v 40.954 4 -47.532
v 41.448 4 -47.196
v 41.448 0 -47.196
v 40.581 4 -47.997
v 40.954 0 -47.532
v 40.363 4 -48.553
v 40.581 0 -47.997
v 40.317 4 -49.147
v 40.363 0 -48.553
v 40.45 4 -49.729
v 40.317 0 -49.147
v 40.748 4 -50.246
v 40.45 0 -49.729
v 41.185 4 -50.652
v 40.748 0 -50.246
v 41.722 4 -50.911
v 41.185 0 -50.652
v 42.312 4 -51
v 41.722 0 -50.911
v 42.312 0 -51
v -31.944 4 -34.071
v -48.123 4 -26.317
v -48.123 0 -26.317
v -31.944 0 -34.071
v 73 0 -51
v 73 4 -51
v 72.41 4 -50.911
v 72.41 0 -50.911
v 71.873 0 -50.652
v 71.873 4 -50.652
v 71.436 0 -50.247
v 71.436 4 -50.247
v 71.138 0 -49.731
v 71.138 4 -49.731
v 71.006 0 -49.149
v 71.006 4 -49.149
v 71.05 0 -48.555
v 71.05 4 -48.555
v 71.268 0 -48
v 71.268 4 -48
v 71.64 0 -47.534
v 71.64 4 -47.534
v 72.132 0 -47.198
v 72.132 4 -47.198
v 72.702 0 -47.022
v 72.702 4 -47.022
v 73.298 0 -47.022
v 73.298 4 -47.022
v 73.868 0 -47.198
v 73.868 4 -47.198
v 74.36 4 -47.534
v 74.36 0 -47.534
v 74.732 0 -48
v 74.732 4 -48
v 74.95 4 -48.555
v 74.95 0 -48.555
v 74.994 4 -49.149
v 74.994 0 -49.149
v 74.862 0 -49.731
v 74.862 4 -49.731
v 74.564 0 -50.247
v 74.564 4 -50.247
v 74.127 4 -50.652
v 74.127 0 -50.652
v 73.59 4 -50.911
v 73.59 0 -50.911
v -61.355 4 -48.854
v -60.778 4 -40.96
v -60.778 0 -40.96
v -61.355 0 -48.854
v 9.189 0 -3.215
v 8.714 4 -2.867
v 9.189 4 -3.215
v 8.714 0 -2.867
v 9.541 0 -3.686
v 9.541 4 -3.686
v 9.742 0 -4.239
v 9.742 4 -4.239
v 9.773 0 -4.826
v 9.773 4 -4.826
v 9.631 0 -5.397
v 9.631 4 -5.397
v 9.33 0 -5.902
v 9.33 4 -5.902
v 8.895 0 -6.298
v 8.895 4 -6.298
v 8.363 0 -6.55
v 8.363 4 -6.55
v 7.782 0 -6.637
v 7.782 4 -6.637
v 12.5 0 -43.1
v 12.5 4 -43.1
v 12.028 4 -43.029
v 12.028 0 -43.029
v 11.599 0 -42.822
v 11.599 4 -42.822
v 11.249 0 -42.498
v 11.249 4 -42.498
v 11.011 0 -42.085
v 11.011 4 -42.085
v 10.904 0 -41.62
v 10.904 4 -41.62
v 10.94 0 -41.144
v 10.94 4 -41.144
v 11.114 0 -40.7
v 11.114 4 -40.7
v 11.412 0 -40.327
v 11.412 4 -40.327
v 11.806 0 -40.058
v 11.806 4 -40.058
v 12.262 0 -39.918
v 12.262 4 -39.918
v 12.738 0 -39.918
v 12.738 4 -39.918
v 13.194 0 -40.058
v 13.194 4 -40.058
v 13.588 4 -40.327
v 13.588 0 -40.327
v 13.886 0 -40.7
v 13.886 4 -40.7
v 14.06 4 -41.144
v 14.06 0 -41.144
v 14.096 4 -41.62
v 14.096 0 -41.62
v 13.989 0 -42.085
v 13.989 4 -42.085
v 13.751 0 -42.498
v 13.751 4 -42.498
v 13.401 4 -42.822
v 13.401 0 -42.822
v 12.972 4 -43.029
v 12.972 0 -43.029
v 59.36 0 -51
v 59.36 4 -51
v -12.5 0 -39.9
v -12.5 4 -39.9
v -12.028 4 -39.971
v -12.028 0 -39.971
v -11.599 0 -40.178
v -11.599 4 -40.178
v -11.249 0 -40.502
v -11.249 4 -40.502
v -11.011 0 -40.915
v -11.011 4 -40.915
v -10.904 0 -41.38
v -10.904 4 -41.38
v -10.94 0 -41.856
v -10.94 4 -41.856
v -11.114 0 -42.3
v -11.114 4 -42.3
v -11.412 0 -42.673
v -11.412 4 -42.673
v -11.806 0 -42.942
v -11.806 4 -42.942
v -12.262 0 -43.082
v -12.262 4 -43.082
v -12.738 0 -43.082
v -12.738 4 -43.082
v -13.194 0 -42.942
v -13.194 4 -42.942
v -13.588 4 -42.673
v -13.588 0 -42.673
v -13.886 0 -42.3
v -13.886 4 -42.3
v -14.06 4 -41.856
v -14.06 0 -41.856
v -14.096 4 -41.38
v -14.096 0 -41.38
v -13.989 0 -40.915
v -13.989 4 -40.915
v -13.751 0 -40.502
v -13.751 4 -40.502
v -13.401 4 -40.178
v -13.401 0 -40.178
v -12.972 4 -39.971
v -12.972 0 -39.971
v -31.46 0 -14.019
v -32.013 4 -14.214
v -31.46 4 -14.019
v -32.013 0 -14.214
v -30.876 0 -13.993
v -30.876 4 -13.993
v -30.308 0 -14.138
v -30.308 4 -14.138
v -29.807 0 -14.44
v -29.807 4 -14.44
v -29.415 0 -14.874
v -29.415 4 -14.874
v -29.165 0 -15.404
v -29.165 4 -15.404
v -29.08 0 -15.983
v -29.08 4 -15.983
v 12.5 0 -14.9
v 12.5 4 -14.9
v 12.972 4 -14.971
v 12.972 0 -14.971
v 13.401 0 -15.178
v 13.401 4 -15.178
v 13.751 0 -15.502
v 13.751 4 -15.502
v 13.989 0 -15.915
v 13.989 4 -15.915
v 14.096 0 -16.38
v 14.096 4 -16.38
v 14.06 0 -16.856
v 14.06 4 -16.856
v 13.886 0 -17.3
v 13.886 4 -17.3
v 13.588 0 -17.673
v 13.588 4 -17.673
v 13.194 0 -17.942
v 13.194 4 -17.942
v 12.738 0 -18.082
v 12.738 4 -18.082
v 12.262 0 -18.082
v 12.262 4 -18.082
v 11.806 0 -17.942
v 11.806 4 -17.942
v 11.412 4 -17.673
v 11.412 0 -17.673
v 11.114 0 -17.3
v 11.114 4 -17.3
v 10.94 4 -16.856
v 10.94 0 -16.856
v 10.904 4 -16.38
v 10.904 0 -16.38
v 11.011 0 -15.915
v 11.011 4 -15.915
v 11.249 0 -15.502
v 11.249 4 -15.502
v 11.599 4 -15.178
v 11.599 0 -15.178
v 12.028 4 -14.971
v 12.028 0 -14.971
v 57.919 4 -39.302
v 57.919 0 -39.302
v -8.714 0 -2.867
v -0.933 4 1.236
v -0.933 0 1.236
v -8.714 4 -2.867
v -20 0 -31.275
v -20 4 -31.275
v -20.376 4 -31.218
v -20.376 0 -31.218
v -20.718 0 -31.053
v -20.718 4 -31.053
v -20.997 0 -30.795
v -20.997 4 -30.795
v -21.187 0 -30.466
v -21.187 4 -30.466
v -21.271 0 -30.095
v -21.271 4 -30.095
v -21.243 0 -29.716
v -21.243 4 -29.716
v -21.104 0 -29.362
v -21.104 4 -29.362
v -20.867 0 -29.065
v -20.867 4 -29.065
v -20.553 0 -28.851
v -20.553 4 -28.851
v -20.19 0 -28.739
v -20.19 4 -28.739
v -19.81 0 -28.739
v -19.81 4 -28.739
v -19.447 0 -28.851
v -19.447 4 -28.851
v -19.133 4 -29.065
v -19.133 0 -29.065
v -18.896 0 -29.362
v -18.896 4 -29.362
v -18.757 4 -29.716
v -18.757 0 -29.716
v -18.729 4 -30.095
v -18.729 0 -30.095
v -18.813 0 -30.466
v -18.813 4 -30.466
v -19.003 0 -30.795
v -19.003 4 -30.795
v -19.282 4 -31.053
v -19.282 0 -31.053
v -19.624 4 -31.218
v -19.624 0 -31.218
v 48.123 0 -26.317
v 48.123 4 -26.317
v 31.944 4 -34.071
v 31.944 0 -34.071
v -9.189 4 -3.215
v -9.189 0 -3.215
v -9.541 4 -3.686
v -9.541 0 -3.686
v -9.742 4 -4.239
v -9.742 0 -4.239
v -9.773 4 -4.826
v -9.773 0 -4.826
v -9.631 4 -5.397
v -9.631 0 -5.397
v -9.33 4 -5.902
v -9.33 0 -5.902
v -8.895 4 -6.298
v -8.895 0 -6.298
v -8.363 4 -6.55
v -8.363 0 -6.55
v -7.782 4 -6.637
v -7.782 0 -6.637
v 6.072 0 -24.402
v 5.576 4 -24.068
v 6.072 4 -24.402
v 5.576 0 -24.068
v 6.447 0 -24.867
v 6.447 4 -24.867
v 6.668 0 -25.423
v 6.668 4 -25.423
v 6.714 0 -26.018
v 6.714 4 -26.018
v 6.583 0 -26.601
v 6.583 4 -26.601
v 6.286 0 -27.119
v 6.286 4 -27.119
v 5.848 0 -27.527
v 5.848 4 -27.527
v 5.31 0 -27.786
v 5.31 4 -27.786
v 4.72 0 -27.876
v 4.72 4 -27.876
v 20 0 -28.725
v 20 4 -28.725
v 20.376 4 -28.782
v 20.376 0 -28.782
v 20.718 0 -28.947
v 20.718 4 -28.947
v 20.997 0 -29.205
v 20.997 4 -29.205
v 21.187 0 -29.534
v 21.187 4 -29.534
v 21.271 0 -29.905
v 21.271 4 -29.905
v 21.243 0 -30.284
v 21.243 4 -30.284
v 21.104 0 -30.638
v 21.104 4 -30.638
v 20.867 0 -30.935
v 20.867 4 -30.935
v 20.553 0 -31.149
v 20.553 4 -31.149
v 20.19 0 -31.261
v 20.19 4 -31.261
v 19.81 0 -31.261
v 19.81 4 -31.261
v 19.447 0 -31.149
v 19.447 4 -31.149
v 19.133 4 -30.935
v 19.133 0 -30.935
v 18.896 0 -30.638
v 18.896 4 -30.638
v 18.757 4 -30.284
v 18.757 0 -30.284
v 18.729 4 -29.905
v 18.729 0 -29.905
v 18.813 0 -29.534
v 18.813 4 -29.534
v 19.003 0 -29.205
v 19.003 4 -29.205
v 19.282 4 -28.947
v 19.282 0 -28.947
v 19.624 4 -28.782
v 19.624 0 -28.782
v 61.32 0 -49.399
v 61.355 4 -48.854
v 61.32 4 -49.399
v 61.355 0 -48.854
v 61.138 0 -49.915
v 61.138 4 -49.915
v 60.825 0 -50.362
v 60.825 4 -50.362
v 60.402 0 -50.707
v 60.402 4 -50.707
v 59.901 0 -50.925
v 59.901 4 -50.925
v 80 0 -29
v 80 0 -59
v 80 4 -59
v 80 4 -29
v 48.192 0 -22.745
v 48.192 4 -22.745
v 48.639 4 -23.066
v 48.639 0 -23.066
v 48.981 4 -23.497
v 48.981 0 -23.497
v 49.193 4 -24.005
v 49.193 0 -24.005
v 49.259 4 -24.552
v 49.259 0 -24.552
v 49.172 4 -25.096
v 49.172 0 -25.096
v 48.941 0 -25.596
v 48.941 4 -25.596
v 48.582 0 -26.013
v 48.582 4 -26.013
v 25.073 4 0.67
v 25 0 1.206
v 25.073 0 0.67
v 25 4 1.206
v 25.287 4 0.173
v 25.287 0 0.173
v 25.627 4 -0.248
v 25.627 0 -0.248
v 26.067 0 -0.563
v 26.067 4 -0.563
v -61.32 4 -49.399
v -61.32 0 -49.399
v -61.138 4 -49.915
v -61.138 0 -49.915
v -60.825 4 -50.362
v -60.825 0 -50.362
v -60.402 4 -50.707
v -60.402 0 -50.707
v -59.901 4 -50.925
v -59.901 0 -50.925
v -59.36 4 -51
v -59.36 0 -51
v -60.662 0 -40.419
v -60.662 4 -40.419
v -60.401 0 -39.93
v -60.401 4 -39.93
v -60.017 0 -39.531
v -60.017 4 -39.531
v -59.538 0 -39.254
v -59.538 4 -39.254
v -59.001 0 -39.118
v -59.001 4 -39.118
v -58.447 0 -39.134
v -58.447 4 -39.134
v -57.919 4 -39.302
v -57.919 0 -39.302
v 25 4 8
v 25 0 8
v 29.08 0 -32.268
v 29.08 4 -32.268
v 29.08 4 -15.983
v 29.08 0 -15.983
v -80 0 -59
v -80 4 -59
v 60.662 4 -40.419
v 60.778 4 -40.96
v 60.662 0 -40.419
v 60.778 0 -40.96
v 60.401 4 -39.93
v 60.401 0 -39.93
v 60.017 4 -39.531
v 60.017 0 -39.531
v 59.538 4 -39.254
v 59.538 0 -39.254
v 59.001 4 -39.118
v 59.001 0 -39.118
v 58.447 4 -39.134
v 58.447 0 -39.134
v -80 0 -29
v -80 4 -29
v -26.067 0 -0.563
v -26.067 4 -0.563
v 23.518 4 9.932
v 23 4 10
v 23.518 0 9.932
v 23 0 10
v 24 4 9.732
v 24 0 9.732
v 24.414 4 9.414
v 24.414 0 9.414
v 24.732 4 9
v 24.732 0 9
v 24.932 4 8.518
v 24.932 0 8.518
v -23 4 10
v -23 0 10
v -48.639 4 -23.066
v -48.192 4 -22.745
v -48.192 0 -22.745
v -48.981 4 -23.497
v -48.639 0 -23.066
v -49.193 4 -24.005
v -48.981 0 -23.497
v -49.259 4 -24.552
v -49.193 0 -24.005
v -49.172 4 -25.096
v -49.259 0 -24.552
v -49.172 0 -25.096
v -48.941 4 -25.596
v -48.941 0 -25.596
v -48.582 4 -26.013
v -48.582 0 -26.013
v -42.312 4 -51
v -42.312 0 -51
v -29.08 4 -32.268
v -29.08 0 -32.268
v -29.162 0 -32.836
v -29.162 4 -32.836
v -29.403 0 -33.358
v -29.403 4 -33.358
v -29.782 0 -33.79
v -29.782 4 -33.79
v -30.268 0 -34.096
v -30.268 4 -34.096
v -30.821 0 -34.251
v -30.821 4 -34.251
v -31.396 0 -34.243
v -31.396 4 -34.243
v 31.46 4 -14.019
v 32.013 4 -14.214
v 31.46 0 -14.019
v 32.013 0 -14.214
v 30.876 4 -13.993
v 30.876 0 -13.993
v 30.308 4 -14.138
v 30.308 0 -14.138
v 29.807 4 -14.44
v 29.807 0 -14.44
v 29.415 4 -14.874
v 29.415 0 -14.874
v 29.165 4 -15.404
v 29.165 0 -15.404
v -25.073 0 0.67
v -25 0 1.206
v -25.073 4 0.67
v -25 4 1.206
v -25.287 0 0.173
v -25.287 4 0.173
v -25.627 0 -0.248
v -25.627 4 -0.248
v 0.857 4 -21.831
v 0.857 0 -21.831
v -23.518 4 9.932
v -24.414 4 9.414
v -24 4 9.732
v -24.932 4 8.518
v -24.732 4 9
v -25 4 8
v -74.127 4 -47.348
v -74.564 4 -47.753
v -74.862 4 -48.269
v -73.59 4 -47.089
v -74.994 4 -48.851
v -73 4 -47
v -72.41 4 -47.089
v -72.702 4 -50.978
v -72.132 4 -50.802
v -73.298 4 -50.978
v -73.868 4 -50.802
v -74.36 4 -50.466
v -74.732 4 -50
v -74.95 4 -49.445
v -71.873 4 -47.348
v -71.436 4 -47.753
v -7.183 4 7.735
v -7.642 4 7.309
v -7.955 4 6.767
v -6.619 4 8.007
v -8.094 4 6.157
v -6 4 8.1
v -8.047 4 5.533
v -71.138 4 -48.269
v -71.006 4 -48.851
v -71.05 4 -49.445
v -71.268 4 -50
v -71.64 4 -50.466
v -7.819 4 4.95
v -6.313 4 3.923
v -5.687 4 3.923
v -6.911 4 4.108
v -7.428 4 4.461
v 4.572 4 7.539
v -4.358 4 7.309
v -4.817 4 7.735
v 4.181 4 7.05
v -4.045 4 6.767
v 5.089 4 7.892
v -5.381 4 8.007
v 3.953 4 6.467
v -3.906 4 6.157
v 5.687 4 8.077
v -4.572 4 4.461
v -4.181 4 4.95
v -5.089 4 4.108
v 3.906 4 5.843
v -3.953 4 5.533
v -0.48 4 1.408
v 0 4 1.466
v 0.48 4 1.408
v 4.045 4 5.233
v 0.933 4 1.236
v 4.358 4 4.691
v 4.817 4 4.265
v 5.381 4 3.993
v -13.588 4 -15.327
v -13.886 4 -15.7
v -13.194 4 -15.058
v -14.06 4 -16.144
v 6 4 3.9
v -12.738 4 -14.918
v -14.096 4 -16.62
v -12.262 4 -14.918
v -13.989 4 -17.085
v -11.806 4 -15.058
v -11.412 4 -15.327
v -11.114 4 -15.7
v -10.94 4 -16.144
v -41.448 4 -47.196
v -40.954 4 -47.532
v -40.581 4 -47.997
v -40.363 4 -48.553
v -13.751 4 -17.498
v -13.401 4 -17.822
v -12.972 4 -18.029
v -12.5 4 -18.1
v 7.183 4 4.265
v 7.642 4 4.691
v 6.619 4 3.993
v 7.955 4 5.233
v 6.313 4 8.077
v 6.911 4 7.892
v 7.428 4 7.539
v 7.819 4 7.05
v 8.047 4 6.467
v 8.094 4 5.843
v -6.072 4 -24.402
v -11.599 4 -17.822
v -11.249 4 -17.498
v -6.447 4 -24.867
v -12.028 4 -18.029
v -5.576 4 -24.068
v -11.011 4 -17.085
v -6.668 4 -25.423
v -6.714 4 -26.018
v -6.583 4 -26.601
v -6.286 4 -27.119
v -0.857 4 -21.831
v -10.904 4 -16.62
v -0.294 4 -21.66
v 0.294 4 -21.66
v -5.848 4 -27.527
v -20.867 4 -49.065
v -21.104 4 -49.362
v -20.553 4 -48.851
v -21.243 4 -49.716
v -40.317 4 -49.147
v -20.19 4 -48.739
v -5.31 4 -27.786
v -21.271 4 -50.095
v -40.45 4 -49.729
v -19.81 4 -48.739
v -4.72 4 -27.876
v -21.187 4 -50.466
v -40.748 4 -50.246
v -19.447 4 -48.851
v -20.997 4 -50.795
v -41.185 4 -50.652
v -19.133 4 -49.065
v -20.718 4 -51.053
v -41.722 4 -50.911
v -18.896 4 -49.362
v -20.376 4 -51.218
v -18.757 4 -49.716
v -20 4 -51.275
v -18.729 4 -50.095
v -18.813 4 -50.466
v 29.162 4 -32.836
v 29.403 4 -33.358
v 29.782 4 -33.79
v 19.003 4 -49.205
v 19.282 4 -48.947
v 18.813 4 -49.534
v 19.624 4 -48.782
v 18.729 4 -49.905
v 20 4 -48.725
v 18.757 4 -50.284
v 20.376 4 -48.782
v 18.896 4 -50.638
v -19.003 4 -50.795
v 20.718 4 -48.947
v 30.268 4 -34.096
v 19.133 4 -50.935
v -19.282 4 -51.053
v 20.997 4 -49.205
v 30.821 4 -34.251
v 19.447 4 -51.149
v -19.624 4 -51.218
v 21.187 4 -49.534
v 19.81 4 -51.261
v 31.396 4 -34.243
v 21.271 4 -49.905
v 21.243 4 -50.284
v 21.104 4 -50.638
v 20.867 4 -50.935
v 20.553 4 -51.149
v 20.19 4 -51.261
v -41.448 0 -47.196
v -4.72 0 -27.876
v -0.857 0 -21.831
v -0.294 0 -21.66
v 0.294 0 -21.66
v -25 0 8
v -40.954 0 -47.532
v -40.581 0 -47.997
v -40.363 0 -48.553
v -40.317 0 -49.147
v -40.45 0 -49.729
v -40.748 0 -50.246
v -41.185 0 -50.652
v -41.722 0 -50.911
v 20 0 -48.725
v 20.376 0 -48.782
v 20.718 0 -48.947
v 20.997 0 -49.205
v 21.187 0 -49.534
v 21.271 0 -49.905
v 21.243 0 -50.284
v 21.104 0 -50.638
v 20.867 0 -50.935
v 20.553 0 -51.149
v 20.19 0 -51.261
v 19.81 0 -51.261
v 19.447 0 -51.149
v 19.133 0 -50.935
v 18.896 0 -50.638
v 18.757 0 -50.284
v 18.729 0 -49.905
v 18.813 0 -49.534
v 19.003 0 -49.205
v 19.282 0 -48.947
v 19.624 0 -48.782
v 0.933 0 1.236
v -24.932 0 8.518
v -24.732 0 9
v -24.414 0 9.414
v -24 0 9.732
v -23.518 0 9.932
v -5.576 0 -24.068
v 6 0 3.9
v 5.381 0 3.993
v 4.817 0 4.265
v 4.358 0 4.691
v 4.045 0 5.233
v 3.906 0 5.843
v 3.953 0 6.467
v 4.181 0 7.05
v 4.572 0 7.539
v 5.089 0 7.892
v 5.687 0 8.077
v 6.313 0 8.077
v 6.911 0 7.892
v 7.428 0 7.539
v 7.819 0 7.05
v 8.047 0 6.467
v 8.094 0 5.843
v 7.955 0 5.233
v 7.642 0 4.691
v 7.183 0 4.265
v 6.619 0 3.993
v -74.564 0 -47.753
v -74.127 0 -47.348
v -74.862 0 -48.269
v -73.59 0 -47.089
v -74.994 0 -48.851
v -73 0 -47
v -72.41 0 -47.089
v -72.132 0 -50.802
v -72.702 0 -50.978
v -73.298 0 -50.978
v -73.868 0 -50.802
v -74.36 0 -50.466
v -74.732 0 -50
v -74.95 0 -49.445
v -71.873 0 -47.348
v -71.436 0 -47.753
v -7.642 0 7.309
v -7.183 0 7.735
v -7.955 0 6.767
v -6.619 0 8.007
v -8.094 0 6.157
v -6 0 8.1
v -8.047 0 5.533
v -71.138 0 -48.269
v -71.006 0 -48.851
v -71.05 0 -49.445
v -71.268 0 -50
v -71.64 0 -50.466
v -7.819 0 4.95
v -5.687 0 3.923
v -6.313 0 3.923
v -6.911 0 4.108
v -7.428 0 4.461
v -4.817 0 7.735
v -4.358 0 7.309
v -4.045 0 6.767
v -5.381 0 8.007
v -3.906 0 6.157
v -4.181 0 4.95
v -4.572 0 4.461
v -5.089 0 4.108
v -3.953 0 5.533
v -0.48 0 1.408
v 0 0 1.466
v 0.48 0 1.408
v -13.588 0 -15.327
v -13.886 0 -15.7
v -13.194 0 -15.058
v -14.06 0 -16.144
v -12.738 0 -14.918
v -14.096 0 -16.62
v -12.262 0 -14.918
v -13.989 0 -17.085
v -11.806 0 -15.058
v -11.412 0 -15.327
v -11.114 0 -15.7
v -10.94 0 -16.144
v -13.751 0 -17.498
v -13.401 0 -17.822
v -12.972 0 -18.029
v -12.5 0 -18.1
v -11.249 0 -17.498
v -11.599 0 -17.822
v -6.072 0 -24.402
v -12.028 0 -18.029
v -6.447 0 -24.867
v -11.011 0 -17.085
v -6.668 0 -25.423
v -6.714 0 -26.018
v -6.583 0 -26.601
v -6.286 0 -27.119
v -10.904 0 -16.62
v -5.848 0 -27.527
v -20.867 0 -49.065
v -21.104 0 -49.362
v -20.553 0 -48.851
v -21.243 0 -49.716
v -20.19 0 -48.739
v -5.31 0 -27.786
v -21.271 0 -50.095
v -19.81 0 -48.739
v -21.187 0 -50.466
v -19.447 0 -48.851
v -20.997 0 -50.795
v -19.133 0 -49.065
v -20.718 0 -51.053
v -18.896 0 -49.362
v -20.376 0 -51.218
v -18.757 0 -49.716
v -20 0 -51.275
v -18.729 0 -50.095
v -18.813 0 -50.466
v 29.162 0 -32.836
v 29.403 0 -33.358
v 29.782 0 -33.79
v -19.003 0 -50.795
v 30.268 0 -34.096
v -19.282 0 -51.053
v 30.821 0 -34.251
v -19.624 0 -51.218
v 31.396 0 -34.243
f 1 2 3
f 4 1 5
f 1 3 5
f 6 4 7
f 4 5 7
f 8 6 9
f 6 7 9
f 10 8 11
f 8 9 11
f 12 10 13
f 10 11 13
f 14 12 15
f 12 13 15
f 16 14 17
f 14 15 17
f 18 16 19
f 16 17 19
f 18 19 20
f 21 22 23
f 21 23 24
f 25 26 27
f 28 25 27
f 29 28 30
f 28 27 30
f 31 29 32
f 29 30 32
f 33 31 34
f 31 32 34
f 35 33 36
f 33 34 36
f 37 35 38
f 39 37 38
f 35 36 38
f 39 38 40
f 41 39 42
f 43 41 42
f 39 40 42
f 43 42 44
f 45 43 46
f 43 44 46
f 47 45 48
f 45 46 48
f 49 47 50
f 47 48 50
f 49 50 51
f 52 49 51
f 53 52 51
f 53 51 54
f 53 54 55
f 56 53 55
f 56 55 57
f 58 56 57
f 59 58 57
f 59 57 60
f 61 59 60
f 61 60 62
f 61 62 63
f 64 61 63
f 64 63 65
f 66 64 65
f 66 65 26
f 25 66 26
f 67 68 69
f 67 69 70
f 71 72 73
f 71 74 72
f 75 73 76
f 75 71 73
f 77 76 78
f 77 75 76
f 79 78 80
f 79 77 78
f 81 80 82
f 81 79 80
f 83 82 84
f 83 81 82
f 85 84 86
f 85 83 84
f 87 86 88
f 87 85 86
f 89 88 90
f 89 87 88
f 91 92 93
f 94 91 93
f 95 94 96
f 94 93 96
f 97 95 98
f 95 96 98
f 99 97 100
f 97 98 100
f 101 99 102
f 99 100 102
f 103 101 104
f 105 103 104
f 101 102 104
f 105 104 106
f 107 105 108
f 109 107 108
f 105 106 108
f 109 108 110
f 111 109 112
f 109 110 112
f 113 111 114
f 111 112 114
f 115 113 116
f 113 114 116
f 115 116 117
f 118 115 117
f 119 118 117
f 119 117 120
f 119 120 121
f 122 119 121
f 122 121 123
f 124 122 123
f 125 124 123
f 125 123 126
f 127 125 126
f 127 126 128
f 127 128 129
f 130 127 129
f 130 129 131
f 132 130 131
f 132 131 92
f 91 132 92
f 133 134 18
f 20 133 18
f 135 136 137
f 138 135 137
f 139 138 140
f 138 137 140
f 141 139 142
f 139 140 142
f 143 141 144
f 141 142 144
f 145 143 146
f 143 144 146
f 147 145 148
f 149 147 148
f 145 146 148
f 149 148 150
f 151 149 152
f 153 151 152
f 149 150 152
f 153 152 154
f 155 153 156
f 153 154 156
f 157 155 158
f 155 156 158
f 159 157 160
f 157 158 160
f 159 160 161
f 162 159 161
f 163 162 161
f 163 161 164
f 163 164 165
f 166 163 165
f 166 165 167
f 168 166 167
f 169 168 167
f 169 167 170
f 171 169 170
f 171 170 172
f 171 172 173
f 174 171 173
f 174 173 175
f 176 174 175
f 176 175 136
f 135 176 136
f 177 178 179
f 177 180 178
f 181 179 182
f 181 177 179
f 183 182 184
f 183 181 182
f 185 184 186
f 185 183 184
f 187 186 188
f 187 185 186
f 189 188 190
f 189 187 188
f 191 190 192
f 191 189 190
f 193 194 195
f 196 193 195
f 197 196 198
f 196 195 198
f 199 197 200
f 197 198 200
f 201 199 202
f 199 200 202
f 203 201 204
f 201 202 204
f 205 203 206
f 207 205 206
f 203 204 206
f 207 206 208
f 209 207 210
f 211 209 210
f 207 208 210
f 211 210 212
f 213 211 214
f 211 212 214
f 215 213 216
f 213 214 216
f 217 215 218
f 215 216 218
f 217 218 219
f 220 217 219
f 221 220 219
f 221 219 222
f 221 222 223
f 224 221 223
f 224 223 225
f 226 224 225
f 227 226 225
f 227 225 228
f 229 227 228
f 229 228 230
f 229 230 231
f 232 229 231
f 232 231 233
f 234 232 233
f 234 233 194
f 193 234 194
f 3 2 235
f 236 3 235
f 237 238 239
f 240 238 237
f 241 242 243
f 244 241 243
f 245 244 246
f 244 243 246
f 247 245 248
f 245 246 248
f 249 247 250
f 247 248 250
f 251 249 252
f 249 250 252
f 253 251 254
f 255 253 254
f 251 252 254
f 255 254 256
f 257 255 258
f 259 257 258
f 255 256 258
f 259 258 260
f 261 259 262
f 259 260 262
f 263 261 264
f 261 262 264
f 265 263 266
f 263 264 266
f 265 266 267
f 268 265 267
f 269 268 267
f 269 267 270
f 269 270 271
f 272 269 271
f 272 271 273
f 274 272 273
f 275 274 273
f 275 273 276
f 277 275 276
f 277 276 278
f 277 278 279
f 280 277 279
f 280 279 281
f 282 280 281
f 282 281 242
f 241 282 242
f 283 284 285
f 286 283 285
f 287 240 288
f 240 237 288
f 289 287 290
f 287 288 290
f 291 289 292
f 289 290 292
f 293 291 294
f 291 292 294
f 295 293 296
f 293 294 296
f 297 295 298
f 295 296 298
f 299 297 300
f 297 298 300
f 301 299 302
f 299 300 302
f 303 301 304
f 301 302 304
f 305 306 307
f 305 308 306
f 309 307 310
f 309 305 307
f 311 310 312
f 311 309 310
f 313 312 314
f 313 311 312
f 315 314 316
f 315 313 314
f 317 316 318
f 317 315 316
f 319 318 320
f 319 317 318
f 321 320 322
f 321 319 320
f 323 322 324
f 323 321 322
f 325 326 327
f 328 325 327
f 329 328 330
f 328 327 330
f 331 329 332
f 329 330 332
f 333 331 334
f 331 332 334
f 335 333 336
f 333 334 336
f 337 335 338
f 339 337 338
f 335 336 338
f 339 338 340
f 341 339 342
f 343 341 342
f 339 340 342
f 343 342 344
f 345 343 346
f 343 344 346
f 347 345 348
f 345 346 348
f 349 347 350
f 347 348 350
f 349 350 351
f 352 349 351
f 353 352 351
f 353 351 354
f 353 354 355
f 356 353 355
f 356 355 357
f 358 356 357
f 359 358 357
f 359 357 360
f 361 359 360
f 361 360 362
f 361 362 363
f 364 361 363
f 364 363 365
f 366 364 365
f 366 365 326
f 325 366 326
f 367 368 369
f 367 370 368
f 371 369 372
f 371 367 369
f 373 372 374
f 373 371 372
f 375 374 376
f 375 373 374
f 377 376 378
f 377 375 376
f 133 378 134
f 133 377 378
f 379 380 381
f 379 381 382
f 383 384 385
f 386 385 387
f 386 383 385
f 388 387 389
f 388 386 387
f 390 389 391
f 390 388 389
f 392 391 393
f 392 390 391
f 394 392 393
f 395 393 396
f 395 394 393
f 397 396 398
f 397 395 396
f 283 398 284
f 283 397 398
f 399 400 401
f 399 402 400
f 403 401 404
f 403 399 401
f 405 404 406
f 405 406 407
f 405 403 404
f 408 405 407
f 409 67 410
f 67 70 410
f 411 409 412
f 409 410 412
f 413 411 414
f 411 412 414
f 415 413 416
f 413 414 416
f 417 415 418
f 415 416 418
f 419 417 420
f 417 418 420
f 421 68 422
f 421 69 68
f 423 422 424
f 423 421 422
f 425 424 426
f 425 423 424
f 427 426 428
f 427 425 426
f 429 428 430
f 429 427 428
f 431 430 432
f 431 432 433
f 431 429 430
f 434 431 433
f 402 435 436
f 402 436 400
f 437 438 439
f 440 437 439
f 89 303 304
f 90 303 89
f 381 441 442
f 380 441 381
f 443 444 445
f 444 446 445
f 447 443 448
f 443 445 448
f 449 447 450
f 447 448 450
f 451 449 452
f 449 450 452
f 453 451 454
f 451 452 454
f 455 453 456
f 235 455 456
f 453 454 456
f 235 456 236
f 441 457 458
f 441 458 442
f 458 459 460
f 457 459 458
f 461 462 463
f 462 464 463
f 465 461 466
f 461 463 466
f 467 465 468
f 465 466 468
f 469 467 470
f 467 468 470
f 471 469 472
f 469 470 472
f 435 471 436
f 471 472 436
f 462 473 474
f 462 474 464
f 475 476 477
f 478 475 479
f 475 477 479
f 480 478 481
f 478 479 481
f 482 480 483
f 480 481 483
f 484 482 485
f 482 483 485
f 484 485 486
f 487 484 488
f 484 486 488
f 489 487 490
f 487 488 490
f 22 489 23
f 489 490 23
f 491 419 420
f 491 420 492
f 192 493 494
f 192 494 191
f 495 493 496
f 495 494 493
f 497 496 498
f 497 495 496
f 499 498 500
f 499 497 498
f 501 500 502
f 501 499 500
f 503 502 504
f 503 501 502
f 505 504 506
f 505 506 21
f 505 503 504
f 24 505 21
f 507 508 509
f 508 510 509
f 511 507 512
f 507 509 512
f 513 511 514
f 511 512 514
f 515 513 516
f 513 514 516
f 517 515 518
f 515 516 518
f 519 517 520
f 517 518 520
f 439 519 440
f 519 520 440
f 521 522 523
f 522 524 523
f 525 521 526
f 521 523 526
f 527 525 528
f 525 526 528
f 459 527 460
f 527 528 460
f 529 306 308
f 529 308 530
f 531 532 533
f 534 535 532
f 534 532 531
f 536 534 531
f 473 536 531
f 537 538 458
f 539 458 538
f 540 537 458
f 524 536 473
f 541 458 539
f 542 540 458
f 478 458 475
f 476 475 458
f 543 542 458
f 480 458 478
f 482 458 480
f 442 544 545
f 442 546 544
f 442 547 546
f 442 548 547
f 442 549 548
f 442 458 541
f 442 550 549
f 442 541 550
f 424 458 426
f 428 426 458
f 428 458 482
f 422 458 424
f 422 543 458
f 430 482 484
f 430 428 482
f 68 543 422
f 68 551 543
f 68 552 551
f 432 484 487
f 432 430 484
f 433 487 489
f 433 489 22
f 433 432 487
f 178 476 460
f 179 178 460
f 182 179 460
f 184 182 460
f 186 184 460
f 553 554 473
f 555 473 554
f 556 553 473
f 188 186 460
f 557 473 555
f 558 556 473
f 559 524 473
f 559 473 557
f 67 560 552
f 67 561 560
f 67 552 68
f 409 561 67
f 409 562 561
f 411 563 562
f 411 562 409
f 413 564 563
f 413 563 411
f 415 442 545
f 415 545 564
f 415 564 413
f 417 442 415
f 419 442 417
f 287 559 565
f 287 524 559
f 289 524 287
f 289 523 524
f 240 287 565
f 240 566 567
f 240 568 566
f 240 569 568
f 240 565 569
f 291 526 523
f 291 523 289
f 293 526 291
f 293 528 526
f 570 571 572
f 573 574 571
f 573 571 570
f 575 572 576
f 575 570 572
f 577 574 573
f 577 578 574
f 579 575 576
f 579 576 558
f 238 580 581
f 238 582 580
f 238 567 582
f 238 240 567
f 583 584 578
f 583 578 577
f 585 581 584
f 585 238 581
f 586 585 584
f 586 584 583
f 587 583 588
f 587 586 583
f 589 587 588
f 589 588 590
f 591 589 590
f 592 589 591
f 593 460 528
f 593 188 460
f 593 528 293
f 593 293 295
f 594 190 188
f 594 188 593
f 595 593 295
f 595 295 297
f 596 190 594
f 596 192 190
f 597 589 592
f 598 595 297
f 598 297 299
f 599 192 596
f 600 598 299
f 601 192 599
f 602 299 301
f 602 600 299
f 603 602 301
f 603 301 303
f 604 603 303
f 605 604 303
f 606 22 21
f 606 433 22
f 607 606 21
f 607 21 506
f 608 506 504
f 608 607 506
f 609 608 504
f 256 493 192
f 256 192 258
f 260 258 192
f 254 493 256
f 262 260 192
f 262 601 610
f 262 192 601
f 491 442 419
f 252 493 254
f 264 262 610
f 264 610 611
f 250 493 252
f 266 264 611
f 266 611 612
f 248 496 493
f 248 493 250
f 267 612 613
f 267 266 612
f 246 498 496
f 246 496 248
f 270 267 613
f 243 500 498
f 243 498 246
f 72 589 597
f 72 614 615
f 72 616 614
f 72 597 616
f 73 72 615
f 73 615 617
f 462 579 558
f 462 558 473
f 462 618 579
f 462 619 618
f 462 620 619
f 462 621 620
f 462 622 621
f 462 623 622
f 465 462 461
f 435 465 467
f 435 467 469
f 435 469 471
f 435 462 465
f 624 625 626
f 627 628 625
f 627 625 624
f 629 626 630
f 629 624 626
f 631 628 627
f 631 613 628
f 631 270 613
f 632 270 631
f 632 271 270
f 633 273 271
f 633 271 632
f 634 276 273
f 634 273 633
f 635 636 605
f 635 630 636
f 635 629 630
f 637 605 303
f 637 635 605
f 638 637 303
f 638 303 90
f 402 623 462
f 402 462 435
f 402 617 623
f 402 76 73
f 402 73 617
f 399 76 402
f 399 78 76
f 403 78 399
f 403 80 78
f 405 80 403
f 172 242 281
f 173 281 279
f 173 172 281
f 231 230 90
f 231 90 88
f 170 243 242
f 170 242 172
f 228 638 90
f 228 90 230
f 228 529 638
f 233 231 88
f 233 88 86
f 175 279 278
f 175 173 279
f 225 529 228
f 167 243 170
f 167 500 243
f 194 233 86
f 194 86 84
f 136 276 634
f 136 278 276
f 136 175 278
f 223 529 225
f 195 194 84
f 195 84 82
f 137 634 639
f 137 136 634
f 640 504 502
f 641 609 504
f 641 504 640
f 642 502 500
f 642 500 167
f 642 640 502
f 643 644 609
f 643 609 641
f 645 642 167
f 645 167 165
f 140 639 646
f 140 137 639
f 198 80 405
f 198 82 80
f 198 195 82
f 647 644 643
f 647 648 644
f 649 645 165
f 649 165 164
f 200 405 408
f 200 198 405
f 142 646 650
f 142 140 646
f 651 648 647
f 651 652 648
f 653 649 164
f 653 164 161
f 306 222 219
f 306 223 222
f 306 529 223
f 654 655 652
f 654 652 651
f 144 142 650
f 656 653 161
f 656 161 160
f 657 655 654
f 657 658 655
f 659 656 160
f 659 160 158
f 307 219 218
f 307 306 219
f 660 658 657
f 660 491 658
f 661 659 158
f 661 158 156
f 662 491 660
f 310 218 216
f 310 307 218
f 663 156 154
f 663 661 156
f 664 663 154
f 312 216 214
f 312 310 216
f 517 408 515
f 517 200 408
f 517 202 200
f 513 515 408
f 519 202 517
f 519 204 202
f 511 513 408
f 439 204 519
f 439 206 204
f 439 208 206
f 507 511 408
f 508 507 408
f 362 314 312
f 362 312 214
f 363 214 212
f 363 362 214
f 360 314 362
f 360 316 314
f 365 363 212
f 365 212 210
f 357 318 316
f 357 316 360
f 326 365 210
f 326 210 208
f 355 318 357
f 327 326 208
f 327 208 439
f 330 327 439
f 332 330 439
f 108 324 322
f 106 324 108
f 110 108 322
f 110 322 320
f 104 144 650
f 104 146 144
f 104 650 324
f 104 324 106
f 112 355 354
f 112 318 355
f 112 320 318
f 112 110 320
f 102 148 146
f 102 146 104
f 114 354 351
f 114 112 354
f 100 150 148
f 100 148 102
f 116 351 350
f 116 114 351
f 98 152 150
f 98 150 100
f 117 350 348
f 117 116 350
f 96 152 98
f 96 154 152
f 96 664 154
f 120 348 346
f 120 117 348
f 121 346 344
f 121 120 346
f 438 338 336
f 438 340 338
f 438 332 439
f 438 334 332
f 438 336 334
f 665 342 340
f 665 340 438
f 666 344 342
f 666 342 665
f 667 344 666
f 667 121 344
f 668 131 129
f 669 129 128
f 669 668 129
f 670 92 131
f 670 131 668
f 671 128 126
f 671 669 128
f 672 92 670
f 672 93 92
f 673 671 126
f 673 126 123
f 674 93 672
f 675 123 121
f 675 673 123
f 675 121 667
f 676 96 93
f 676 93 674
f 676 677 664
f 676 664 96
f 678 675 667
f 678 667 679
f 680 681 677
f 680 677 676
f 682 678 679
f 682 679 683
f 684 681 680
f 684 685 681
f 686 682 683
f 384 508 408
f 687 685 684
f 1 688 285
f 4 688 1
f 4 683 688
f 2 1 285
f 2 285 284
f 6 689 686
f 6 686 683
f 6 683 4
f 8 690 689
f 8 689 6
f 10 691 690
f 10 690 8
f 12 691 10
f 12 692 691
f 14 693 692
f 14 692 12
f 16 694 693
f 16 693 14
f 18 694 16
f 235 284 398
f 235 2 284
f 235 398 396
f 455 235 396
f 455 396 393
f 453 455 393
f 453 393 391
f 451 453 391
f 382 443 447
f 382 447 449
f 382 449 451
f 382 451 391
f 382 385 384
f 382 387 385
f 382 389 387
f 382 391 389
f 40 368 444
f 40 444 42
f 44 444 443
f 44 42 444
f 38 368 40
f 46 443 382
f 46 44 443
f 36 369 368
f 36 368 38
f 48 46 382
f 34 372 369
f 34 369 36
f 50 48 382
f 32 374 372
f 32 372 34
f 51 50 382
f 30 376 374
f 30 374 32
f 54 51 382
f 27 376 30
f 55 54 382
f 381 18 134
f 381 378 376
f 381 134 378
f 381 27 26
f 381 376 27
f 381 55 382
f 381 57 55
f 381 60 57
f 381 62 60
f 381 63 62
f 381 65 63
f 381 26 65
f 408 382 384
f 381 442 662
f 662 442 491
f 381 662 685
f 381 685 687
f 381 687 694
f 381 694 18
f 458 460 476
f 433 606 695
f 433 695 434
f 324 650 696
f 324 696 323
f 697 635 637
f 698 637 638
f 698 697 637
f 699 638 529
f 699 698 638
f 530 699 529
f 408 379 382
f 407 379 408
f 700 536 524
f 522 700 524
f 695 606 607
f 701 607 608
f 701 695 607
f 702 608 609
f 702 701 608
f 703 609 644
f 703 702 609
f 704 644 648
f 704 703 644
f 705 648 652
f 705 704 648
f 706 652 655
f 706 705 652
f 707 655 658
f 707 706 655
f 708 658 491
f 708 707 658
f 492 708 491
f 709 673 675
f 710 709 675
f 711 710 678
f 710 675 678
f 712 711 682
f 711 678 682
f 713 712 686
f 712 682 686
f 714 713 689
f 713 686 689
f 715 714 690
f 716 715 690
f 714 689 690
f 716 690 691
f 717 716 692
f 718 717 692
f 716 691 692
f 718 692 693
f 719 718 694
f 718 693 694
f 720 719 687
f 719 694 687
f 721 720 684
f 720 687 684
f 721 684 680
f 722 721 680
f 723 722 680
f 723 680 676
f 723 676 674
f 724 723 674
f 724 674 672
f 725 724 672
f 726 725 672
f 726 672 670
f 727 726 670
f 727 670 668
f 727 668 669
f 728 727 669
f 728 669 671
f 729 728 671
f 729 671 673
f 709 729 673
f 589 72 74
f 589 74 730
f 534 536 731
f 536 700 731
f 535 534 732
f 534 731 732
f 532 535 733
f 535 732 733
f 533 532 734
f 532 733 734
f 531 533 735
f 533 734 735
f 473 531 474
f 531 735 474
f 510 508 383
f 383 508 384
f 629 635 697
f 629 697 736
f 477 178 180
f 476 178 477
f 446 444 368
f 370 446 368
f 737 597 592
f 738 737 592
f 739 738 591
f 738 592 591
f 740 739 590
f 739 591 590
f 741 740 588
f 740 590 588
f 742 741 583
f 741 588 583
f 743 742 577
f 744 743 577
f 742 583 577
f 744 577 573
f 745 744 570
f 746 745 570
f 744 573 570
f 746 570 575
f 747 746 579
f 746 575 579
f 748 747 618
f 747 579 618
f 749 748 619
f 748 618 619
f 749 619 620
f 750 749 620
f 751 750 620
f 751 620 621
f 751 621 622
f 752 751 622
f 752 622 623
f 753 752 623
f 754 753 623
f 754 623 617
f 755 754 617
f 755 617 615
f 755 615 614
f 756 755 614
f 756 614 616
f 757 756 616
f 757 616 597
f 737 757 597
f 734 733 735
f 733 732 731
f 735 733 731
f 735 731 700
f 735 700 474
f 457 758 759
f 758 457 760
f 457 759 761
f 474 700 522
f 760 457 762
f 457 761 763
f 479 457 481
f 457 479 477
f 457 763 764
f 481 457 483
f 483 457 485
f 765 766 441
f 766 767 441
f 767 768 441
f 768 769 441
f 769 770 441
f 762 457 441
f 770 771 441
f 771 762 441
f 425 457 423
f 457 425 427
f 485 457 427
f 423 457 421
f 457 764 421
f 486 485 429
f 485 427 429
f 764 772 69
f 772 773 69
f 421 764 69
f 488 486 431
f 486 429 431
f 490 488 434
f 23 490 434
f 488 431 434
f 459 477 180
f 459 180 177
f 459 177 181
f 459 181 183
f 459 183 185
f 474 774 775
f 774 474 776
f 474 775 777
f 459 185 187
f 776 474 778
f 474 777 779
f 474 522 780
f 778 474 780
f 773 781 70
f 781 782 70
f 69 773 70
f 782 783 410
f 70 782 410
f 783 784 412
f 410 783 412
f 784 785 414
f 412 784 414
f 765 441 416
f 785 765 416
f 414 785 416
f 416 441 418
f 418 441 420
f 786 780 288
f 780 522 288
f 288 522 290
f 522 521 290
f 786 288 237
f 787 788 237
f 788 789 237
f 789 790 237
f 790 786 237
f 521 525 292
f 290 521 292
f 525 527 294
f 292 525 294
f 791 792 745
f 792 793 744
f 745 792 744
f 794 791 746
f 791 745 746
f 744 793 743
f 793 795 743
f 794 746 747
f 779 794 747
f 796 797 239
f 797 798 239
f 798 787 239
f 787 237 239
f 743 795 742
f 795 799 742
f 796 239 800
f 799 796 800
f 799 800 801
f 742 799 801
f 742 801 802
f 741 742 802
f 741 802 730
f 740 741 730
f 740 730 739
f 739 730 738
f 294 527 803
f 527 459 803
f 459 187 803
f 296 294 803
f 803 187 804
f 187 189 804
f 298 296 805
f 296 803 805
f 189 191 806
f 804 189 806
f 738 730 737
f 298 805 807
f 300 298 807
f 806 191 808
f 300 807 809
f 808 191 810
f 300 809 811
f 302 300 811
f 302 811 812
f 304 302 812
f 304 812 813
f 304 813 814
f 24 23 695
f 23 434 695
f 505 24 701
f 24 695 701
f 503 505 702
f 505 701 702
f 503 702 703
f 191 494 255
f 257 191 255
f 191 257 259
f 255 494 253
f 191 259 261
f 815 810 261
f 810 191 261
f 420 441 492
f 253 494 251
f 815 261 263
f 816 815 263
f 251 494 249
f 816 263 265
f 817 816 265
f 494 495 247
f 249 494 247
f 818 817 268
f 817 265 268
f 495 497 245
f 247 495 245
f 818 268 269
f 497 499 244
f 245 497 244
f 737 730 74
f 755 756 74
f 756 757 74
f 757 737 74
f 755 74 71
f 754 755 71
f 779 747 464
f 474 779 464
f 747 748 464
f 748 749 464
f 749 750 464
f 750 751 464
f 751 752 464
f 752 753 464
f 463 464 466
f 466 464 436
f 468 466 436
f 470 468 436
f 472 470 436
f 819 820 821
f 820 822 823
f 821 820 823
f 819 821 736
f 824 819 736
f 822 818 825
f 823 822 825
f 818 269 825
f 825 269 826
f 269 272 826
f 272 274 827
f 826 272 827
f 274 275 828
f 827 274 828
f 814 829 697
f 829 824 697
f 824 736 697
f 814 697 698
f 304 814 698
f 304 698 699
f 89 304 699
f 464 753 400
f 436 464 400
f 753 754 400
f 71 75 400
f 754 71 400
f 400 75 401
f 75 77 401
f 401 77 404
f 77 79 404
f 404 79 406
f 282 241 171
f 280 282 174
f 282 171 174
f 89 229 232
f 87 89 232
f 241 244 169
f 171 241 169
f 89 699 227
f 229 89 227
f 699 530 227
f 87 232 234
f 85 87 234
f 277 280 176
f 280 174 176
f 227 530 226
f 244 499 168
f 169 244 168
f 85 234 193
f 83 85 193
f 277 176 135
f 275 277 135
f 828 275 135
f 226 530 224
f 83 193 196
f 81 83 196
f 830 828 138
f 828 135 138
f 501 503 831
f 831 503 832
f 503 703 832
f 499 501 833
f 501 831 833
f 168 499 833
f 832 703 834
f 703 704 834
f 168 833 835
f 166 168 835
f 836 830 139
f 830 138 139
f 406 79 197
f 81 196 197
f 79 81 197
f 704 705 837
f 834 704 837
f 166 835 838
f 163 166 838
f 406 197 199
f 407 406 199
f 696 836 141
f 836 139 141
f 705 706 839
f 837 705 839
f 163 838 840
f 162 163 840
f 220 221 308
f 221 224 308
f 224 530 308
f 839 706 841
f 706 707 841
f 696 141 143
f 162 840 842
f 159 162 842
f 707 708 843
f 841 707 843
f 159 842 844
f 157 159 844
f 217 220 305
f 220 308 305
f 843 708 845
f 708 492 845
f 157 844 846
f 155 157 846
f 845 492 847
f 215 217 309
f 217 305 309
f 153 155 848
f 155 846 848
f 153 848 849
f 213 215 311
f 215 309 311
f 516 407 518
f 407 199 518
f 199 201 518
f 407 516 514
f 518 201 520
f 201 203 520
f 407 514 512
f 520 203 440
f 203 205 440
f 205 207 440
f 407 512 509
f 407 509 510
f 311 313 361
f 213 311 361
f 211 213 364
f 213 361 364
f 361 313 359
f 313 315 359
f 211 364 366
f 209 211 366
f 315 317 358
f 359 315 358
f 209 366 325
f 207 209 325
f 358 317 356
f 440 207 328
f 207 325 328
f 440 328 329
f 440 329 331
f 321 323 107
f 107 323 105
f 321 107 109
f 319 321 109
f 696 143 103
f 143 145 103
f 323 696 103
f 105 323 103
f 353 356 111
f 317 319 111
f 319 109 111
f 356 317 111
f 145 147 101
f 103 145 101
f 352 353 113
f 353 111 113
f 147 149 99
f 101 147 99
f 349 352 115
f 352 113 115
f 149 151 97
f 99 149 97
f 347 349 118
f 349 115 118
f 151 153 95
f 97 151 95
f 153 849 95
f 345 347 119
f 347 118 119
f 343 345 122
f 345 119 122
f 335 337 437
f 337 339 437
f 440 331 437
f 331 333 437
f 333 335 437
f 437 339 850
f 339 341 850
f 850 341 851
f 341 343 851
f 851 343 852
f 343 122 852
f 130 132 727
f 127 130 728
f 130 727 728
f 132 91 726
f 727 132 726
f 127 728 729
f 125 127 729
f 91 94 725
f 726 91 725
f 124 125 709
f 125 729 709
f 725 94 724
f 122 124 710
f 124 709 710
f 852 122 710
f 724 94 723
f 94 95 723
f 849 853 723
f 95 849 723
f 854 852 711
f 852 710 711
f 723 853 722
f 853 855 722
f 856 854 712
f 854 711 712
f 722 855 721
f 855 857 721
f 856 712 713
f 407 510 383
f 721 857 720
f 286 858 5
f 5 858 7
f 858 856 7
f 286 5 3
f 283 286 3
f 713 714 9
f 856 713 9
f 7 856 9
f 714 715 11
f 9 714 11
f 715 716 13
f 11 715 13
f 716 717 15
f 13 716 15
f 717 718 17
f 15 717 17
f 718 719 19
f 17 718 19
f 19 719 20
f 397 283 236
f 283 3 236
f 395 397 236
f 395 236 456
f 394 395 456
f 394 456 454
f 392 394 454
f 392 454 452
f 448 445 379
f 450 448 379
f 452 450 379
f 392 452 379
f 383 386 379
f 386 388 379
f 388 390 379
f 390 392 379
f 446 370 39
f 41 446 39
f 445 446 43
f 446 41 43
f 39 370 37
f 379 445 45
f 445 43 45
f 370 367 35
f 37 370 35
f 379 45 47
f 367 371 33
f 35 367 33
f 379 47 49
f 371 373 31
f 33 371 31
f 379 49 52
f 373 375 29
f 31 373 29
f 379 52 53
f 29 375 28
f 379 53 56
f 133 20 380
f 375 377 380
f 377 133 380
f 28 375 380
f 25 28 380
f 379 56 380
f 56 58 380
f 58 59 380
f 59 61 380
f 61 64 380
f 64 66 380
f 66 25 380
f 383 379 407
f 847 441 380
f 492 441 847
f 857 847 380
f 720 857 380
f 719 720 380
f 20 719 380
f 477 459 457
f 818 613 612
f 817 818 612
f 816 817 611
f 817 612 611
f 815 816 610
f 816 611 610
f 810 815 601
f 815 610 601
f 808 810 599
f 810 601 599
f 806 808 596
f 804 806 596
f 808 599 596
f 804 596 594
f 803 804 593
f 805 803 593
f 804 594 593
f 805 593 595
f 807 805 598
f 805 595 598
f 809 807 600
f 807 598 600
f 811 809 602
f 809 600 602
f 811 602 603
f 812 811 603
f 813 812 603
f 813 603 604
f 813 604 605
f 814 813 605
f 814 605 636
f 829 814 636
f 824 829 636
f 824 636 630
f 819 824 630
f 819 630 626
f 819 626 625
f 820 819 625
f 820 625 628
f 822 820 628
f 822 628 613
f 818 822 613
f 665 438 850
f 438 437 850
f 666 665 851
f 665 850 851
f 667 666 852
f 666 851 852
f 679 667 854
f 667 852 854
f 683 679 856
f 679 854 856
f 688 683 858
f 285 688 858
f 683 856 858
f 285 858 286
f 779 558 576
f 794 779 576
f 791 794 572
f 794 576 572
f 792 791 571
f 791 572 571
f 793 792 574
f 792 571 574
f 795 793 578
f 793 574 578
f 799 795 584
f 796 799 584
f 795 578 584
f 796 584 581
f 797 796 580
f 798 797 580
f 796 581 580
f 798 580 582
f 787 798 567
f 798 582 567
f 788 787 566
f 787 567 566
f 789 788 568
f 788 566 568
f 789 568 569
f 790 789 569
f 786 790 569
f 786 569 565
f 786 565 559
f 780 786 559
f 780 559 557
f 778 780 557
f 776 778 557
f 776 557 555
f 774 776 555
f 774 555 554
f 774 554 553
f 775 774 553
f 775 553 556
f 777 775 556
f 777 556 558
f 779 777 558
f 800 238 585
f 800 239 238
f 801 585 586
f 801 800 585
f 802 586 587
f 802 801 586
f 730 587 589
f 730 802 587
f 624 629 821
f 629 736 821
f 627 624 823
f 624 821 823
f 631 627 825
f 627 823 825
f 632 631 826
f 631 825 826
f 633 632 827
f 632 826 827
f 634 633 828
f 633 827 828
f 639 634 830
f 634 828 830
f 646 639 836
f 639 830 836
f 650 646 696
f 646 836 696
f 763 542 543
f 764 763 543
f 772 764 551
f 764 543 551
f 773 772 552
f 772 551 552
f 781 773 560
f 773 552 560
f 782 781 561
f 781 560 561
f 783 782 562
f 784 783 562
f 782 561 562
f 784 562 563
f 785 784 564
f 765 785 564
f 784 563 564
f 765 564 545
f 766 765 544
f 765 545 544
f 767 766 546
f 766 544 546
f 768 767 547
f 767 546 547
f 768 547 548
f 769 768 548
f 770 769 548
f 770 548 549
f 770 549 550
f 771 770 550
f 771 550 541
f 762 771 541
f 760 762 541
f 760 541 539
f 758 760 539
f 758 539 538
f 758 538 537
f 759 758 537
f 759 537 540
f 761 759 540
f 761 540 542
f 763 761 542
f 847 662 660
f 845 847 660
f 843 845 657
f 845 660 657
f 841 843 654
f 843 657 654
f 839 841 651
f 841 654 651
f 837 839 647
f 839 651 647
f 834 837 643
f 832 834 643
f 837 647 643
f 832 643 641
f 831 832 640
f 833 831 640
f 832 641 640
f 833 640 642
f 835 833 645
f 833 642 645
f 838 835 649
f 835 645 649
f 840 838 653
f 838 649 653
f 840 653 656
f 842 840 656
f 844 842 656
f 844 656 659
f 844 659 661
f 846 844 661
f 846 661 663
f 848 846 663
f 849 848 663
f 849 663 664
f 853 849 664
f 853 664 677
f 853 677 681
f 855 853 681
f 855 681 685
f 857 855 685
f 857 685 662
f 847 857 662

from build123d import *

# Parameters (mm, degrees)
EXTRUDE_1_DEPTH     = 4
SKETCH_2_R          = 1.6
CUT_EXTRUDE_1_DEPTH = 100.483667001
SKETCH_4_R          = 1.275
CUT_EXTRUDE_3_DEPTH = 10
SKETCH_6_W          = 50
SKETCH_6_H          = 10
EXTRUDE_2_DEPTH     = 4
SKETCH_7_R          = 2.1
CUT_EXTRUDE_4_DEPTH = 10
SKETCH_8_R          = 2
CUT_EXTRUDE_5_DEPTH = 10
CUT_EXTRUDE_6_DEPTH = 10
CUT_EXTRUDE_7_DEPTH = 10
FILLET_2_R          = 2


with BuildPart() as part:
    # 草图1 → 凸台-拉伸1 (new body)
    with BuildSketch(Plane(origin=(0, 0, 0), x_dir=(1, 0, 0), z_dir=(0, 1, 0))):
        Polygon((25, 0), (-25, 0), (-80, 29), (-80, 59), (80, 59), (80, 29), align=None)
    extrude(amount=EXTRUDE_1_DEPTH)

    # 草图2 → 切除-拉伸1 (cut, through all)
    with BuildSketch(Plane(origin=(0, 4, 0), x_dir=(1, 0, 0), z_dir=(0, 1, 0))):
        with Locations(Location((-12.5, 41.5, 0), (0, 0, 270))):
            Circle(SKETCH_2_R)
        with Locations(Location((12.5, 41.5, 0), (0, 0, 90))):
            Circle(SKETCH_2_R)
        with Locations(Location((-12.5, 16.5, 0), (0, 0, 90))):
            Circle(SKETCH_2_R)
        with Locations(Location((12.5, 16.5, 0), (0, 0, 270))):
            Circle(SKETCH_2_R)
    extrude(amount=-CUT_EXTRUDE_1_DEPTH, mode=Mode.SUBTRACT)

    # 草图4 → 切除-拉伸3 (cut)
    with BuildSketch(Plane(origin=(0, 4, 0), x_dir=(1, 0, 0), z_dir=(0, 1, 0))):
        with Locations(Location((20, 50, 0), (0, 0, 270))):
            Circle(SKETCH_4_R)
        with Locations(Location((20, 30, 0), (0, 0, 270))):
            Circle(SKETCH_4_R)
        with Locations(Location((-20, 30, 0), (0, 0, 90))):
            Circle(SKETCH_4_R)
        with Locations(Location((-20, 50, 0), (0, 0, 90))):
            Circle(SKETCH_4_R)
    extrude(amount=-CUT_EXTRUDE_3_DEPTH, mode=Mode.SUBTRACT)

    # 草图6 → 凸台-拉伸2 (add)
    with BuildSketch(Plane(origin=(0, 4, 0), x_dir=(1, 0, 0), z_dir=(0, 1, 0))):
        with Locations((0, -5)):
            Rectangle(SKETCH_6_W, SKETCH_6_H)
    extrude(amount=-EXTRUDE_2_DEPTH)

    # 草图7 → 切除-拉伸4 (cut)
    with BuildSketch(Plane(origin=(0, 4, 0), x_dir=(1, 0, 0), z_dir=(0, 1, 0))):
        with Locations(Location((-6, -6, 0), (0, 0, 270))):
            Circle(SKETCH_7_R)
        with Locations(Location((6, -6, 0), (0, 0, 90))):
            Circle(SKETCH_7_R)
    extrude(amount=-CUT_EXTRUDE_4_DEPTH, mode=Mode.SUBTRACT)

    # 草图8 → 切除-拉伸5 (cut)
    with BuildSketch(Plane(origin=(0, 4, 0), x_dir=(1, 0, 0), z_dir=(0, 1, 0))):
        with Locations(Location((-73, 49, 0), (0, 0, 270))):
            Circle(SKETCH_8_R)
        with Locations(Location((73, 49, 0), (0, 0, 90))):
            Circle(SKETCH_8_R)
    extrude(amount=-CUT_EXTRUDE_5_DEPTH, mode=Mode.SUBTRACT)

    # 草图9 → 切除-拉伸6 (cut)
    with BuildSketch(Plane(origin=(0, 4, 0), x_dir=(1, 0, 0), z_dir=(0, 1, 0))):
        Polygon((-13.607153835, 27.875584016), (13.607153835, 27.875584016), (0, 21.424785161), align=None)
        Polygon((-61.511227824, 51), (-33.511227824, 51), (-60.564799252, 38.03449681), align=None)
        Polygon((-51.708784474, 24.598987773), (-29.079791665, 35.443998725), (-29.079791665, 12.667337019), align=None)
        Polygon((29.079791665, 12.667337019), (51.708784474, 24.598987773), (29.079791665, 35.443998725), align=None)
        Polygon((60.564799252, 38.03449681), (61.511227824, 51), (33.511227824, 51), align=None)
    extrude(amount=-CUT_EXTRUDE_6_DEPTH, mode=Mode.SUBTRACT)

    # 草图10 → 切除-拉伸7 (cut)
    with BuildSketch(Plane(origin=(0, 4, 0), x_dir=(1, 0, 0), z_dir=(0, 1, 0))):
        Polygon((-15.862821337, 6.636596525), (15.862821337, 6.636596525), (0, -1.727436544), align=None)
    extrude(amount=-CUT_EXTRUDE_7_DEPTH, mode=Mode.SUBTRACT)

    # 圆角2
    fillet_2_edges = [part.edges().sort_by_distance(p)[0] for p in [
        (25, 2, 0),
        (-25, 2, 0),
        (60.564799252, 2, -38.03449681),
        (33.511227824, 2, -51),
        (61.511227824, 2, -51),
        (29.079791665, 2, -12.667337019),
        (29.079791665, 2, -35.443998725),
        (51.708784474, 2, -24.598987773),
        (-29.079791665, 2, -12.667337019),
        (-51.708784474, 2, -24.598987773),
        (-29.079791665, 2, -35.443998725),
        (-60.564799252, 2, -38.03449681),
        (-61.511227824, 2, -51),
        (-33.511227824, 2, -51),
        (0, 2, -21.424785161),
        (-13.607153835, 2, -27.875584016),
        (13.607153835, 2, -27.875584016),
        (15.862821337, 2, -6.636596525),
        (0, 2, 1.727436544),
        (-15.862821337, 2, -6.636596525),
        (25, 2, 10),
        (-25, 2, 10),
    ]]
    fillet(fillet_2_edges, radius=FILLET_2_R)


solid = part.part
